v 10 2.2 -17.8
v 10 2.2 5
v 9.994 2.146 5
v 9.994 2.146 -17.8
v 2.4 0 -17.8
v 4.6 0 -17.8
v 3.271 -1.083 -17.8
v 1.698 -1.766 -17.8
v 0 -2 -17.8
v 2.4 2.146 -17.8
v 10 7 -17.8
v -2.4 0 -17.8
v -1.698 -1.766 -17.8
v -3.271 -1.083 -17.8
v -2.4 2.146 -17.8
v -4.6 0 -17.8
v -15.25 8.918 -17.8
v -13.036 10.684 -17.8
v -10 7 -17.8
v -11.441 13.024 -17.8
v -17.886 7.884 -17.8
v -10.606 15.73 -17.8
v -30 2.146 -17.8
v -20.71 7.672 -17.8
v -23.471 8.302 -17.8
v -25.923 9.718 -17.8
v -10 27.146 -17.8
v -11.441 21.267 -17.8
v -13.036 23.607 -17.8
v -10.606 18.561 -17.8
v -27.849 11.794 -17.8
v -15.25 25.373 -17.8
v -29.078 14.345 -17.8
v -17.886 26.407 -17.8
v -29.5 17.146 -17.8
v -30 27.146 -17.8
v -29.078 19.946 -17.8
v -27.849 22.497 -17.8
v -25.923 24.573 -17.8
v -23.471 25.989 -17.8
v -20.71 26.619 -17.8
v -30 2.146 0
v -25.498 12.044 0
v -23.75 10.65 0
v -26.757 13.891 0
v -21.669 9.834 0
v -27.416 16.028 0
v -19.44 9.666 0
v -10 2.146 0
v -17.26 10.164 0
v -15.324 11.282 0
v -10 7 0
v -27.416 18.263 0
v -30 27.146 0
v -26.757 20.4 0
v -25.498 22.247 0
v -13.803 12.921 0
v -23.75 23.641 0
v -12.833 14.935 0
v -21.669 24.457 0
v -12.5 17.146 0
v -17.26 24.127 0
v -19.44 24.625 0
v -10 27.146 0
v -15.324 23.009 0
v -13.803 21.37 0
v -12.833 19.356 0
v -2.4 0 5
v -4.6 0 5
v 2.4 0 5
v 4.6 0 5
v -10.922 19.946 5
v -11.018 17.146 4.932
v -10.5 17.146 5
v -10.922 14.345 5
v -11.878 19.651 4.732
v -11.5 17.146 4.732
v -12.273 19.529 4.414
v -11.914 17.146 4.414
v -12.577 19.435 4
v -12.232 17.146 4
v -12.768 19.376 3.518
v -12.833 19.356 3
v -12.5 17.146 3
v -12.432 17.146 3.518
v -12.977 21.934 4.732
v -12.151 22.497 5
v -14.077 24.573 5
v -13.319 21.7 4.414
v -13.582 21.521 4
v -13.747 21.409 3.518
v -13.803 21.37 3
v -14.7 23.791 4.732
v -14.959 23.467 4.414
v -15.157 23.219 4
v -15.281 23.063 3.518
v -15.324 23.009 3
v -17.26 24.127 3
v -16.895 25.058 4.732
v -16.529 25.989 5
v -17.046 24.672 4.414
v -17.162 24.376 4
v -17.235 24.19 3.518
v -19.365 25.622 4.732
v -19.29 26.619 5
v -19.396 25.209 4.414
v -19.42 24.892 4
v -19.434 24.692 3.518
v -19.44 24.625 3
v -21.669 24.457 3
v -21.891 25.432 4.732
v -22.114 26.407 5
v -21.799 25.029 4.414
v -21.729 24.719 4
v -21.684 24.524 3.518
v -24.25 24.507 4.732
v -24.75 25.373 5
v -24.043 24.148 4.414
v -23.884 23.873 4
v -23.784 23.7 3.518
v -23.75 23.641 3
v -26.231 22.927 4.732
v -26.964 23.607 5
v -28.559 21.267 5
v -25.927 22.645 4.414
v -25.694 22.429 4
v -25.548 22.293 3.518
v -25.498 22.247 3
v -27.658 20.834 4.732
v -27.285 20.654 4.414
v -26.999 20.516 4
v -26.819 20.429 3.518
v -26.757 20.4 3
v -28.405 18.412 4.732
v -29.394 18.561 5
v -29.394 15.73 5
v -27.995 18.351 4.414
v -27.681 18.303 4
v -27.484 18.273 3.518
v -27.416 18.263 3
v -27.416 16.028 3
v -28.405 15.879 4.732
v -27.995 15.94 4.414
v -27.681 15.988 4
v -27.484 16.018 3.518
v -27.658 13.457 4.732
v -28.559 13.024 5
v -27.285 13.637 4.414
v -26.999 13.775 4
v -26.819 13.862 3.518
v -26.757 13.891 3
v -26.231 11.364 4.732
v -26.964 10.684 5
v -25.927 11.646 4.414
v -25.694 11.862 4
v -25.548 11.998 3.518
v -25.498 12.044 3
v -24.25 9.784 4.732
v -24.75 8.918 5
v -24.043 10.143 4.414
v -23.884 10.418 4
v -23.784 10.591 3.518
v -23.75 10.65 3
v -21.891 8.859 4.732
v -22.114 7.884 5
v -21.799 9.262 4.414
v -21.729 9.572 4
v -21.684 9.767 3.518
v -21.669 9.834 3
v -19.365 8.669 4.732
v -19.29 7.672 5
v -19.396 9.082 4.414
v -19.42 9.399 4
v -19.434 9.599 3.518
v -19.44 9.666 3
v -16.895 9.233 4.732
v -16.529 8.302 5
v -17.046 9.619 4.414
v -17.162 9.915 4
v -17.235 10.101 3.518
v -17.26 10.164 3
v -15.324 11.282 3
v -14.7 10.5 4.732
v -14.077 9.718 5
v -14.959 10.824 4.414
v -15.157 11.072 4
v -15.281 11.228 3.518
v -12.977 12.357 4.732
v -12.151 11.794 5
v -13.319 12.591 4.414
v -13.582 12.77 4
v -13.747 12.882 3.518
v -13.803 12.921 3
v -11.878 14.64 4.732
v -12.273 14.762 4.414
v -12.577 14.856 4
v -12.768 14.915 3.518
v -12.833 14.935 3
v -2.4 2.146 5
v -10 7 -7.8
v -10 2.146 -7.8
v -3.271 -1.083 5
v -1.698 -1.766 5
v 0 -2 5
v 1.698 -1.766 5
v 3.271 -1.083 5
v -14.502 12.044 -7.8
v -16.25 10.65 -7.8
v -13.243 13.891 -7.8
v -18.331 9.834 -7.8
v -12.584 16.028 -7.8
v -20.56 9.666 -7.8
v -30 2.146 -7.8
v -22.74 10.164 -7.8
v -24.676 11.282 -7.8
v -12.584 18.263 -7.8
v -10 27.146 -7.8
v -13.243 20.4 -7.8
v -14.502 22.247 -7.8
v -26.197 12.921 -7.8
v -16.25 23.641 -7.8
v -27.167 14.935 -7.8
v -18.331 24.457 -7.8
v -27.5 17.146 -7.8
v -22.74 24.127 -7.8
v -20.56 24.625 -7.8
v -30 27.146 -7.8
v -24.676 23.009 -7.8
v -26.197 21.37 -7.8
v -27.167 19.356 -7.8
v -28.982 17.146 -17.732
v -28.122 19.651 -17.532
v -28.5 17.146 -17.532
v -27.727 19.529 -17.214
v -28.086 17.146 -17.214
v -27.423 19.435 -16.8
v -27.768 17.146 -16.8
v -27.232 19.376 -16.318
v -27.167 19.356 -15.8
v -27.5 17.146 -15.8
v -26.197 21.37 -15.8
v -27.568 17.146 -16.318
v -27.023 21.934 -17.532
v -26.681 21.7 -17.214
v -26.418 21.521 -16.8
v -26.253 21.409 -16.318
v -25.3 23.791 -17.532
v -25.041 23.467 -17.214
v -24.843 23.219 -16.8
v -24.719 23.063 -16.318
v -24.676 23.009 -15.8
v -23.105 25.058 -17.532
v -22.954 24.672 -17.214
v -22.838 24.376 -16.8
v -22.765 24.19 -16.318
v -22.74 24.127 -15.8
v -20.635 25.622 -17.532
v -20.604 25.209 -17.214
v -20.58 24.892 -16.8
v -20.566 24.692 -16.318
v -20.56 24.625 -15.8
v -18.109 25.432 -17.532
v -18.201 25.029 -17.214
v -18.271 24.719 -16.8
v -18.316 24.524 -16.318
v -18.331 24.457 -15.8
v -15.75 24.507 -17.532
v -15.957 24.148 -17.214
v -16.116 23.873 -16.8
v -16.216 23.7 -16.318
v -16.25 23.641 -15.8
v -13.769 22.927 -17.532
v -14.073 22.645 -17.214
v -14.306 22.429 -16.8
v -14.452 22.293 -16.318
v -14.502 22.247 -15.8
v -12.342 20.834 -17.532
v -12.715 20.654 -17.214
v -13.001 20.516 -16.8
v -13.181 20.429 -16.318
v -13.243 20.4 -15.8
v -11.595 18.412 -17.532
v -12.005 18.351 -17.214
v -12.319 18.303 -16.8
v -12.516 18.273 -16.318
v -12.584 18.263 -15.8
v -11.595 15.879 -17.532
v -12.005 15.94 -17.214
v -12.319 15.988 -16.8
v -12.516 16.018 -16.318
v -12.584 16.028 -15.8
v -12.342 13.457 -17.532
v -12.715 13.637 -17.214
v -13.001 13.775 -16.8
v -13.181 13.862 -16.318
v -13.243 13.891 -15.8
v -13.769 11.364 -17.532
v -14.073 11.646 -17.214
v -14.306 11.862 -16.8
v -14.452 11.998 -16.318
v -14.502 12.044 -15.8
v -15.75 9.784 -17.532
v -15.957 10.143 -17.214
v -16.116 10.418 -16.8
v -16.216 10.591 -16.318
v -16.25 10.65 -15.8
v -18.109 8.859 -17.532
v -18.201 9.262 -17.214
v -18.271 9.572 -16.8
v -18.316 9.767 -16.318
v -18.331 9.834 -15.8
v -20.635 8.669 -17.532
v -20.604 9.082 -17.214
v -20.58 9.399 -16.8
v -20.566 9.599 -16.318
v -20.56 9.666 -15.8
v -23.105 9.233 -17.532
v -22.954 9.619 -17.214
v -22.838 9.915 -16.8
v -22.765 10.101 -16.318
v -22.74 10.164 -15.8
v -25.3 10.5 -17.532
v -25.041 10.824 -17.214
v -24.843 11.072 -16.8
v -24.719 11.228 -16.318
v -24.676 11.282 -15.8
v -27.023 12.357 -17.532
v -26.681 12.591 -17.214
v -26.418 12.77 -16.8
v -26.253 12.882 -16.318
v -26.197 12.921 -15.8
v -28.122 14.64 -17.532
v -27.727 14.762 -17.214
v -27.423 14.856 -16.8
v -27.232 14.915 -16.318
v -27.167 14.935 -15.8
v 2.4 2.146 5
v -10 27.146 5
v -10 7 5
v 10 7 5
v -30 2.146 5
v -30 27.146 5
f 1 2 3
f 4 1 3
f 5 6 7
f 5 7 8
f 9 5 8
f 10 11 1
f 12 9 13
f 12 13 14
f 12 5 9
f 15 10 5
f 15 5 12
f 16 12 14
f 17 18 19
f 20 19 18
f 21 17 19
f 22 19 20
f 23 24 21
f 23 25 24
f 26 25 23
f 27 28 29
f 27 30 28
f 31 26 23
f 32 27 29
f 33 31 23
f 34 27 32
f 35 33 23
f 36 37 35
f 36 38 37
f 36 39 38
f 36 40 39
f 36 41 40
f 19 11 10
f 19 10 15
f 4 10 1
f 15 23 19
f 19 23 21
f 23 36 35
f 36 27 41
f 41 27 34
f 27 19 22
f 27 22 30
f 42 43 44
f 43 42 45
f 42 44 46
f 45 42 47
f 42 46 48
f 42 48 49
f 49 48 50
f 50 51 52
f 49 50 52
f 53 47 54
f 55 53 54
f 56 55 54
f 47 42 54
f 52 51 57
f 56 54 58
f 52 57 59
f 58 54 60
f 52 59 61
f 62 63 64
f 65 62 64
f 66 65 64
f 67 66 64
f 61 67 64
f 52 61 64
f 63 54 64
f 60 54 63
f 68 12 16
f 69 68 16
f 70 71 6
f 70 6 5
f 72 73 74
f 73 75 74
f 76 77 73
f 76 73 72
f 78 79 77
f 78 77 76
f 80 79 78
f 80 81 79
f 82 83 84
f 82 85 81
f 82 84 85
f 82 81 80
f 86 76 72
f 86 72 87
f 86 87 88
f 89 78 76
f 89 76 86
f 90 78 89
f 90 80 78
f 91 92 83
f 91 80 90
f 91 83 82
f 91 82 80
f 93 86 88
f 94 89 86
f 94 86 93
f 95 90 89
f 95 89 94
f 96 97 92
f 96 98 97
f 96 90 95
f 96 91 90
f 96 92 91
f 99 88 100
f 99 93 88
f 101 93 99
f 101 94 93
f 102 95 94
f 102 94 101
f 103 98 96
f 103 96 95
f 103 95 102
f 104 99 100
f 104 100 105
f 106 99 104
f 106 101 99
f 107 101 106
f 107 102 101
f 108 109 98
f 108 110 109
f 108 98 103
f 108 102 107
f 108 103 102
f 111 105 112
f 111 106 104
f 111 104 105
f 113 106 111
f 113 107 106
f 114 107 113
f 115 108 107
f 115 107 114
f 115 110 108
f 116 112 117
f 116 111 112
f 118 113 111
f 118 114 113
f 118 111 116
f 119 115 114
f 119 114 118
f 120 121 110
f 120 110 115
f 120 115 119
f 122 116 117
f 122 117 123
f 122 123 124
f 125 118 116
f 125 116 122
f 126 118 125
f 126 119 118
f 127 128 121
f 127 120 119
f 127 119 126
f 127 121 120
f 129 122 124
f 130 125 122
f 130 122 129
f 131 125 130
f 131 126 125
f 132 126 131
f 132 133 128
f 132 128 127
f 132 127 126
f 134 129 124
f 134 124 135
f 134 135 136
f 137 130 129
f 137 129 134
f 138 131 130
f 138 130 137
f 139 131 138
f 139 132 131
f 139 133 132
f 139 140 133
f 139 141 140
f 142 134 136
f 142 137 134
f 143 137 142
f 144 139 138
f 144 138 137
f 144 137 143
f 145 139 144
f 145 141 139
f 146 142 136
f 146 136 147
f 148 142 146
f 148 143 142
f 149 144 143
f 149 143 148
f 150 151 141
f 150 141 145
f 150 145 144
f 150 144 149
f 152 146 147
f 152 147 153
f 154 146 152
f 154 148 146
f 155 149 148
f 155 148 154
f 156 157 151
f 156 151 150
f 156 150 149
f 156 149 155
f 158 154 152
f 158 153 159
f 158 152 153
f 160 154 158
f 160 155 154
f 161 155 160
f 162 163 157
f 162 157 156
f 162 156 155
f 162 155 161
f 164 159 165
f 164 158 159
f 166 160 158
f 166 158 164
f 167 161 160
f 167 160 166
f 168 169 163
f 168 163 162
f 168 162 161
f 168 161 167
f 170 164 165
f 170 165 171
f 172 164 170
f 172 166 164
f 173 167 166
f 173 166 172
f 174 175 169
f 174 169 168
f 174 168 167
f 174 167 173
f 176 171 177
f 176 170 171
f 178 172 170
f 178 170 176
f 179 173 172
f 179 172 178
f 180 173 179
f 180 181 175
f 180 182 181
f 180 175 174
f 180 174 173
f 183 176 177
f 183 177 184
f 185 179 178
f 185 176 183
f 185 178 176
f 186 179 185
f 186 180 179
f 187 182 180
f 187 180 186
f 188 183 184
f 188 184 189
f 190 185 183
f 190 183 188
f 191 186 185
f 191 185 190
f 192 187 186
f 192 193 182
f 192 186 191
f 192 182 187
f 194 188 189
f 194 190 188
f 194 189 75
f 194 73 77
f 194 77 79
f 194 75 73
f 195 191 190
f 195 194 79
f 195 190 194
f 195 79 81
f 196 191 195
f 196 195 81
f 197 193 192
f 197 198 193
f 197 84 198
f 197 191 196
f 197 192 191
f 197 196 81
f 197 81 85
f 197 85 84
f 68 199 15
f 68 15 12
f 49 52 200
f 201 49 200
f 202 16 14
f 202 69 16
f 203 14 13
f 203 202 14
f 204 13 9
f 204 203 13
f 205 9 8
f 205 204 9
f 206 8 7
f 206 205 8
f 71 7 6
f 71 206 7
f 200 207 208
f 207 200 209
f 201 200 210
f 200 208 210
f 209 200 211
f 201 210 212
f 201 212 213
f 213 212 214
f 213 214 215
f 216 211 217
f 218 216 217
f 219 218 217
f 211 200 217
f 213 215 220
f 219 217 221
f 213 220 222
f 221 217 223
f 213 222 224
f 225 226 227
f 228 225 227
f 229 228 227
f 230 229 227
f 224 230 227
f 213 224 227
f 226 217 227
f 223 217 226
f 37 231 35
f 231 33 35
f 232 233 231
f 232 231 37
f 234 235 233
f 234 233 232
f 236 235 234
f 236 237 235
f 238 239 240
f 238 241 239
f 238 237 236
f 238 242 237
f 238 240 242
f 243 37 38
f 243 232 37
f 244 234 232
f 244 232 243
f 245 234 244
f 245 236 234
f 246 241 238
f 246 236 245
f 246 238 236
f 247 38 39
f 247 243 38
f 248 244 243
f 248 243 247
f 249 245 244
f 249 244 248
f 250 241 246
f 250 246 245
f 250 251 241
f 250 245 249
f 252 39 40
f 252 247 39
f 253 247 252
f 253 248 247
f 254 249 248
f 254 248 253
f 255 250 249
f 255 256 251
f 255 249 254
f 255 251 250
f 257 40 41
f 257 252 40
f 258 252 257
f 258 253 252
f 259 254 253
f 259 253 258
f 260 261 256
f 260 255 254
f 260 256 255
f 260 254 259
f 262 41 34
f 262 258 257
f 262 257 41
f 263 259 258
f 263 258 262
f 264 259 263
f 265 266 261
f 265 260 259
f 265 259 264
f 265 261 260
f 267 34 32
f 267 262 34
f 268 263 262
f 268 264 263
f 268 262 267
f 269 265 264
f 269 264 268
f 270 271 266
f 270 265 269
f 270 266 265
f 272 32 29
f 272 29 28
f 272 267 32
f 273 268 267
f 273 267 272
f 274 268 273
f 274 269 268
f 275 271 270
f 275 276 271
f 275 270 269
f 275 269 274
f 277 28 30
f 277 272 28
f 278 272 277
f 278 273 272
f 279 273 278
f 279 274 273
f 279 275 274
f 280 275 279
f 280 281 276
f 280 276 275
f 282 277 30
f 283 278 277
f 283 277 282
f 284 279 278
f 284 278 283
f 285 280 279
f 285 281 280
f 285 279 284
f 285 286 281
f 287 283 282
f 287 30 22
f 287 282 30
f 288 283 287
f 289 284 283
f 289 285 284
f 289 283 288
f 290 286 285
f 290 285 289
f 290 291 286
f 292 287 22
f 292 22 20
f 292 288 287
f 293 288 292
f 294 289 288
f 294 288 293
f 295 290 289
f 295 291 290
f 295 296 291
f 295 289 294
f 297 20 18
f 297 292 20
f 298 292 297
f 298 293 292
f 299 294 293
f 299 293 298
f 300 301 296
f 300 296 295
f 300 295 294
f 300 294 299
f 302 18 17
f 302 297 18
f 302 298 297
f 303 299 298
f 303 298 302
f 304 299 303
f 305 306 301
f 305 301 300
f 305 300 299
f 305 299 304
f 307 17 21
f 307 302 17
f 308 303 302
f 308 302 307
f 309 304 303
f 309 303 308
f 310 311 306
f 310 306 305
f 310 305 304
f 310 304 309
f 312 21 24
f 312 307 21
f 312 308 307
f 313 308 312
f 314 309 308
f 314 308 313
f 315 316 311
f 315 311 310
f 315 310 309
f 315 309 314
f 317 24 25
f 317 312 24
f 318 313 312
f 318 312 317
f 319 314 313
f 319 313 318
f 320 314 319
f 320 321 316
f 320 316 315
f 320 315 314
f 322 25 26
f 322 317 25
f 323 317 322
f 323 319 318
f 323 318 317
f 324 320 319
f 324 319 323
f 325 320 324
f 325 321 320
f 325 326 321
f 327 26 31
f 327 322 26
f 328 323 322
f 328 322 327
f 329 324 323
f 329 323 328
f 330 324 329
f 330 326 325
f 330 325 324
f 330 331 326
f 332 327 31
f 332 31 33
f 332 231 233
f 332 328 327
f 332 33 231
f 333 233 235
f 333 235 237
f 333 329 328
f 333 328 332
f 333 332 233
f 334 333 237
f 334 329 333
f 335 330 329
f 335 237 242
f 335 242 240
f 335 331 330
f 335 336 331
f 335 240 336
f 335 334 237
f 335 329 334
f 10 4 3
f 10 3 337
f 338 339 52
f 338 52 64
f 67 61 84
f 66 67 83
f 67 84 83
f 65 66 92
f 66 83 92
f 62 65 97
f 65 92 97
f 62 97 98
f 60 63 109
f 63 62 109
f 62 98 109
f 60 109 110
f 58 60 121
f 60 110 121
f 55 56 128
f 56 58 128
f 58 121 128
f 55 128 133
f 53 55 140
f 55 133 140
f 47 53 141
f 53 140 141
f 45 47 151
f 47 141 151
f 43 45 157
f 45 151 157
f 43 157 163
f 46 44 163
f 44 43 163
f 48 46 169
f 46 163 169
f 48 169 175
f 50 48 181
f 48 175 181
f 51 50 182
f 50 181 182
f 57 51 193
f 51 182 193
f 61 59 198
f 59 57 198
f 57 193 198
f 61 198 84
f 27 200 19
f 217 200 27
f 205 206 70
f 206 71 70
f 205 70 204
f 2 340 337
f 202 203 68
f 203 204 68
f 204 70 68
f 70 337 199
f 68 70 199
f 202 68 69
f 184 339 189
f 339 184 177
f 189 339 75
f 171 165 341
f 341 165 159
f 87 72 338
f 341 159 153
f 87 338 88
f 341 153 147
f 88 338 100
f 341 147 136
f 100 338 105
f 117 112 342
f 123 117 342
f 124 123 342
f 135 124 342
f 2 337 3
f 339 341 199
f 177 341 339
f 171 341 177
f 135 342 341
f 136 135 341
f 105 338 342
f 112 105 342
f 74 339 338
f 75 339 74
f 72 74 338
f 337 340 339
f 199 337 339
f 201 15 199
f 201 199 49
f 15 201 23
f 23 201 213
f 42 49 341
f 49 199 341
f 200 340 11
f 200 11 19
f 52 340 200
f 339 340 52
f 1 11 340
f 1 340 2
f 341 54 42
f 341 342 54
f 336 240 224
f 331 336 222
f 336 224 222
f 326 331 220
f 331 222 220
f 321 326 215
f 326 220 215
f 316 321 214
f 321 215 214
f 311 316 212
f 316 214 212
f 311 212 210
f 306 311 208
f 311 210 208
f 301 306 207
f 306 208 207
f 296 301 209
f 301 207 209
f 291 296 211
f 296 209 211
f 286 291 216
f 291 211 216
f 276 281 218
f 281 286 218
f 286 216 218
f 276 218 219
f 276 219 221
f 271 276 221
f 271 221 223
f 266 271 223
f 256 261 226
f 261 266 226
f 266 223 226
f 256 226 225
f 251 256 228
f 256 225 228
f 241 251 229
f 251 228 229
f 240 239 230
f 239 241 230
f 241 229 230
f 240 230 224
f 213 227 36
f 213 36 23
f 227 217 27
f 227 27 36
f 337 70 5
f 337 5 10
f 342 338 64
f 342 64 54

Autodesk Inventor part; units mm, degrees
ref_plane "YZ Plane" through (0, 0, 0) normal (1, 0, 0) x (0, 1, 0)
ref_plane "XZ Plane" through (0, 0, 0) normal (0, 1, 0) x (-1, 0, 0)
ref_plane "XY Plane" through (0, 0, 0) normal (0, 0, 1) x (1, 0, 0)
sketch "Skizze2" plane through (0, 0, 0) normal (0, 0, 1) x (1, 0, 0)
  line L0 (2.4, 0) -> (2.4, 7)
  line L1 (-2.4, 0) -> (-2.4, 7)
  line L2 (0, 0) -> (2.4, 0) construction
  line L3 (-2.4, 7) -> (2.4, 7)
  line L4 (-2.4, 0) -> (-4.6, 0)
  line L5 (2.4, 0) -> (4.6, 0)
  arc A0 (-4.6, 0) -> (4.6, 0) centre (0, 4.29) ccw
  point P0 (0, -2)
  dimension "d0" = 7
  dimension "d1" = 4.8
  dimension "d2" = 2.4
  dimension "d3" = 2.2
  dimension "d4" = 2
extrude "Extrusion1" add sketch "Skizze2" along normal blind 5
sketch "Skizze3" plane through (0, 0, 5) normal (0, 0, 1) x (1, 0, 0)
  line L0 (-2.4, 0) -> (-2.4, 2.2) construction
  line L1 (-2.4, 2.2) -> (-10, 2.2)
  line L2 (-2.4, 2.2) -> (10, 2.2)
  line L3 (-10, 2.2) -> (10, 2.2)
  line L4 (10, 2.2) -> (10, 7)
  line L5 (10, 7) -> (-10, 7)
  line L6 (-10, 7) -> (-10, 2.2)
  point P0 (0, 0)
  point P1 (2.4, 7)
  dimension "d7" = 2.2
  dimension "d8" = 20
  dimension "d9" = 10
  dimension "d10" = 20
extrude "Extrusion2" add sketch "Skizze3" against normal blind 5
sketch "Skizze5" plane through (-10, 2.2, 5) normal (-1, 0, 0) x (0, 0, 1)
  line L0 (0, 4.8) -> (-5, 4.8) projected
  line L1 (-5, 4.8) -> (0, 4.8)
  line L2 (0, 4.8) -> (0, -0.0545)
  line L3 (0, -0.0545) -> (-5, -0.0545)
  line L4 (-5, -0.0545) -> (-5, 4.8)
  point P0 (-5, -2.2)
extrude "Extrusion3" add sketch "Skizze5" along normal blind 5
sketch "Skizze6" plane through (-10, 2.1455, 0) normal (0, -1, 0) x (1, 0, 0)
  line L0 (0, 5) -> (7.6, 5) projected
  line L1 (0, 5) -> (-5, 5) projected
  line L2 (0, 5) -> (-5, 5)
  line L3 (-5, 5) -> (-5, 0)
  line L4 (-5, 0) -> (0, 0)
  line L5 (0, 0) -> (0, 5)
  point P0 (10, 0)
extrude "Extrusion4" add sketch "Skizze6" against normal blind 25
sketch "Skizze12" plane through (-15, 2.2, 5) normal (-1, 0, 0) x (0, 0, 1)
  line L0 (0, -0.0545) -> (0, 24.9455) projected
  line L1 (-5, -0.0545) -> (-5, 24.9455) projected
  line L2 (0, -0.0545) -> (-5, -0.0545)
  line L3 (-5, -0.0545) -> (-5, 24.9455)
  line L4 (-5, 24.9455) -> (0, 24.9455)
  line L5 (0, 24.9455) -> (0, -0.0545)
  point P0 (-5, -2.2)
extrude "Extrusion9" add sketch "Skizze12" along normal blind 15
sketch "Skizze13" plane through (0, 0, 5) normal (0, 0, 1) x (1, 0, 0)
  circle A0 centre (-20, 17.1455) radius 7.5
  line L0 (-10, 27.1455) -> (-30, 27.1455) projected
  line L1 (-30, 2.1455) -> (-30, 27.1455) projected
  point P0 (0, 0)
  point P1 (-20, 27.1455)
  dimension "d31" = 15
  dimension "d32" = 10
  dimension "d33" = 10
extrude "Extrusion10" cut sketch "Skizze13" against normal blind 15
sketch "Skizze14" plane through (0, 0, 0) normal (0, 0, -1) x (-1, 0, 0)
  line L0 (10, 2.2) -> (10, 2.1455) projected
  line L1 (10, 2.2) -> (10, 2.1455)
  line L2 (10, 2.1455) -> (-9.9939, 2.1455)
  line L3 (-10, 2.2) -> (-2.4, 2.2) projected
  line L4 (-9.9939, 2.1455) -> (-10, 2.2)
  line L5 (-10, 2.2) -> (10, 2.2)
  point P0 (0, 0)
extrude "Extrusion11" add sketch "Skizze14" against normal blind 5
sketch "Skizze16" plane through (0, 0, 0) normal (0, 0, -1) x (-1, 0, 0)
  line L0 (2.4, 2.1455) -> (30, 2.1455) projected
  line L1 (30, 27.1455) -> (30, 2.1455) projected
  line L2 (10, 27.1455) -> (30, 27.1455) projected
  line L3 (10, 7) -> (10, 27.1455) projected
  line L4 (-10, 7) -> (10, 7) projected
  line L5 (-10, 7) -> (-10, 2.2) projected
  line L6 (-10, 2.2) -> (-9.9939, 2.1455) projected
  line L7 (-9.9939, 2.1455) -> (-2.4, 2.1455) projected
  line L8 (-2.4, 0) -> (-2.4, 2.1455) projected
  line L9 (-4.6, 0) -> (-2.4, 0) projected
  arc A0 (-4.6, 0) -> (4.6, 0) centre (0, 4.29) ccw projected
  line L10 (2.4, 0) -> (4.6, 0) projected
  line L11 (2.4, 2.1455) -> (2.4, 0) projected
  circle A1 centre (20, 17.1455) radius 7.5 projected
  point P0 (0, 0)
extrude "Extrusion12" add sketch "Skizze16" along normal blind 17.8
sketch "Skizze17" plane through (-10, 27.1455, 0) normal (0, 1, 0) x (1, 0, 0)
  line L0 (0, -5) -> (-20, -5) projected
  line L1 (0, -5) -> (0, 17.8) projected
  line L2 (-20, 17.8) -> (0, 17.8) projected
  line L3 (-20, -5) -> (-20, 17.8) projected
  line L4 (0, 7.8) -> (-20, 7.8)
  line L5 (-20, -5) -> (-20, 17.8) projected
  line L6 (-20, 7.8) -> (-20, 0)
  line L7 (-20, 0) -> (0, 0)
  line L8 (0, 7.8) -> (0, 0)
  point P0 (10, 0)
  dimension "d41" = 10
  dimension "d42" = 7.8
extrude "Extrusion13" cut sketch "Skizze17" against normal through all contours L7 L3 L4 L1
fillet "Rundung3" radius 2 2 edges at (-27.5, 17.1455, 5) (-12.5, 17.1455, -17.8)
properties part number "Connector MiniTec"
